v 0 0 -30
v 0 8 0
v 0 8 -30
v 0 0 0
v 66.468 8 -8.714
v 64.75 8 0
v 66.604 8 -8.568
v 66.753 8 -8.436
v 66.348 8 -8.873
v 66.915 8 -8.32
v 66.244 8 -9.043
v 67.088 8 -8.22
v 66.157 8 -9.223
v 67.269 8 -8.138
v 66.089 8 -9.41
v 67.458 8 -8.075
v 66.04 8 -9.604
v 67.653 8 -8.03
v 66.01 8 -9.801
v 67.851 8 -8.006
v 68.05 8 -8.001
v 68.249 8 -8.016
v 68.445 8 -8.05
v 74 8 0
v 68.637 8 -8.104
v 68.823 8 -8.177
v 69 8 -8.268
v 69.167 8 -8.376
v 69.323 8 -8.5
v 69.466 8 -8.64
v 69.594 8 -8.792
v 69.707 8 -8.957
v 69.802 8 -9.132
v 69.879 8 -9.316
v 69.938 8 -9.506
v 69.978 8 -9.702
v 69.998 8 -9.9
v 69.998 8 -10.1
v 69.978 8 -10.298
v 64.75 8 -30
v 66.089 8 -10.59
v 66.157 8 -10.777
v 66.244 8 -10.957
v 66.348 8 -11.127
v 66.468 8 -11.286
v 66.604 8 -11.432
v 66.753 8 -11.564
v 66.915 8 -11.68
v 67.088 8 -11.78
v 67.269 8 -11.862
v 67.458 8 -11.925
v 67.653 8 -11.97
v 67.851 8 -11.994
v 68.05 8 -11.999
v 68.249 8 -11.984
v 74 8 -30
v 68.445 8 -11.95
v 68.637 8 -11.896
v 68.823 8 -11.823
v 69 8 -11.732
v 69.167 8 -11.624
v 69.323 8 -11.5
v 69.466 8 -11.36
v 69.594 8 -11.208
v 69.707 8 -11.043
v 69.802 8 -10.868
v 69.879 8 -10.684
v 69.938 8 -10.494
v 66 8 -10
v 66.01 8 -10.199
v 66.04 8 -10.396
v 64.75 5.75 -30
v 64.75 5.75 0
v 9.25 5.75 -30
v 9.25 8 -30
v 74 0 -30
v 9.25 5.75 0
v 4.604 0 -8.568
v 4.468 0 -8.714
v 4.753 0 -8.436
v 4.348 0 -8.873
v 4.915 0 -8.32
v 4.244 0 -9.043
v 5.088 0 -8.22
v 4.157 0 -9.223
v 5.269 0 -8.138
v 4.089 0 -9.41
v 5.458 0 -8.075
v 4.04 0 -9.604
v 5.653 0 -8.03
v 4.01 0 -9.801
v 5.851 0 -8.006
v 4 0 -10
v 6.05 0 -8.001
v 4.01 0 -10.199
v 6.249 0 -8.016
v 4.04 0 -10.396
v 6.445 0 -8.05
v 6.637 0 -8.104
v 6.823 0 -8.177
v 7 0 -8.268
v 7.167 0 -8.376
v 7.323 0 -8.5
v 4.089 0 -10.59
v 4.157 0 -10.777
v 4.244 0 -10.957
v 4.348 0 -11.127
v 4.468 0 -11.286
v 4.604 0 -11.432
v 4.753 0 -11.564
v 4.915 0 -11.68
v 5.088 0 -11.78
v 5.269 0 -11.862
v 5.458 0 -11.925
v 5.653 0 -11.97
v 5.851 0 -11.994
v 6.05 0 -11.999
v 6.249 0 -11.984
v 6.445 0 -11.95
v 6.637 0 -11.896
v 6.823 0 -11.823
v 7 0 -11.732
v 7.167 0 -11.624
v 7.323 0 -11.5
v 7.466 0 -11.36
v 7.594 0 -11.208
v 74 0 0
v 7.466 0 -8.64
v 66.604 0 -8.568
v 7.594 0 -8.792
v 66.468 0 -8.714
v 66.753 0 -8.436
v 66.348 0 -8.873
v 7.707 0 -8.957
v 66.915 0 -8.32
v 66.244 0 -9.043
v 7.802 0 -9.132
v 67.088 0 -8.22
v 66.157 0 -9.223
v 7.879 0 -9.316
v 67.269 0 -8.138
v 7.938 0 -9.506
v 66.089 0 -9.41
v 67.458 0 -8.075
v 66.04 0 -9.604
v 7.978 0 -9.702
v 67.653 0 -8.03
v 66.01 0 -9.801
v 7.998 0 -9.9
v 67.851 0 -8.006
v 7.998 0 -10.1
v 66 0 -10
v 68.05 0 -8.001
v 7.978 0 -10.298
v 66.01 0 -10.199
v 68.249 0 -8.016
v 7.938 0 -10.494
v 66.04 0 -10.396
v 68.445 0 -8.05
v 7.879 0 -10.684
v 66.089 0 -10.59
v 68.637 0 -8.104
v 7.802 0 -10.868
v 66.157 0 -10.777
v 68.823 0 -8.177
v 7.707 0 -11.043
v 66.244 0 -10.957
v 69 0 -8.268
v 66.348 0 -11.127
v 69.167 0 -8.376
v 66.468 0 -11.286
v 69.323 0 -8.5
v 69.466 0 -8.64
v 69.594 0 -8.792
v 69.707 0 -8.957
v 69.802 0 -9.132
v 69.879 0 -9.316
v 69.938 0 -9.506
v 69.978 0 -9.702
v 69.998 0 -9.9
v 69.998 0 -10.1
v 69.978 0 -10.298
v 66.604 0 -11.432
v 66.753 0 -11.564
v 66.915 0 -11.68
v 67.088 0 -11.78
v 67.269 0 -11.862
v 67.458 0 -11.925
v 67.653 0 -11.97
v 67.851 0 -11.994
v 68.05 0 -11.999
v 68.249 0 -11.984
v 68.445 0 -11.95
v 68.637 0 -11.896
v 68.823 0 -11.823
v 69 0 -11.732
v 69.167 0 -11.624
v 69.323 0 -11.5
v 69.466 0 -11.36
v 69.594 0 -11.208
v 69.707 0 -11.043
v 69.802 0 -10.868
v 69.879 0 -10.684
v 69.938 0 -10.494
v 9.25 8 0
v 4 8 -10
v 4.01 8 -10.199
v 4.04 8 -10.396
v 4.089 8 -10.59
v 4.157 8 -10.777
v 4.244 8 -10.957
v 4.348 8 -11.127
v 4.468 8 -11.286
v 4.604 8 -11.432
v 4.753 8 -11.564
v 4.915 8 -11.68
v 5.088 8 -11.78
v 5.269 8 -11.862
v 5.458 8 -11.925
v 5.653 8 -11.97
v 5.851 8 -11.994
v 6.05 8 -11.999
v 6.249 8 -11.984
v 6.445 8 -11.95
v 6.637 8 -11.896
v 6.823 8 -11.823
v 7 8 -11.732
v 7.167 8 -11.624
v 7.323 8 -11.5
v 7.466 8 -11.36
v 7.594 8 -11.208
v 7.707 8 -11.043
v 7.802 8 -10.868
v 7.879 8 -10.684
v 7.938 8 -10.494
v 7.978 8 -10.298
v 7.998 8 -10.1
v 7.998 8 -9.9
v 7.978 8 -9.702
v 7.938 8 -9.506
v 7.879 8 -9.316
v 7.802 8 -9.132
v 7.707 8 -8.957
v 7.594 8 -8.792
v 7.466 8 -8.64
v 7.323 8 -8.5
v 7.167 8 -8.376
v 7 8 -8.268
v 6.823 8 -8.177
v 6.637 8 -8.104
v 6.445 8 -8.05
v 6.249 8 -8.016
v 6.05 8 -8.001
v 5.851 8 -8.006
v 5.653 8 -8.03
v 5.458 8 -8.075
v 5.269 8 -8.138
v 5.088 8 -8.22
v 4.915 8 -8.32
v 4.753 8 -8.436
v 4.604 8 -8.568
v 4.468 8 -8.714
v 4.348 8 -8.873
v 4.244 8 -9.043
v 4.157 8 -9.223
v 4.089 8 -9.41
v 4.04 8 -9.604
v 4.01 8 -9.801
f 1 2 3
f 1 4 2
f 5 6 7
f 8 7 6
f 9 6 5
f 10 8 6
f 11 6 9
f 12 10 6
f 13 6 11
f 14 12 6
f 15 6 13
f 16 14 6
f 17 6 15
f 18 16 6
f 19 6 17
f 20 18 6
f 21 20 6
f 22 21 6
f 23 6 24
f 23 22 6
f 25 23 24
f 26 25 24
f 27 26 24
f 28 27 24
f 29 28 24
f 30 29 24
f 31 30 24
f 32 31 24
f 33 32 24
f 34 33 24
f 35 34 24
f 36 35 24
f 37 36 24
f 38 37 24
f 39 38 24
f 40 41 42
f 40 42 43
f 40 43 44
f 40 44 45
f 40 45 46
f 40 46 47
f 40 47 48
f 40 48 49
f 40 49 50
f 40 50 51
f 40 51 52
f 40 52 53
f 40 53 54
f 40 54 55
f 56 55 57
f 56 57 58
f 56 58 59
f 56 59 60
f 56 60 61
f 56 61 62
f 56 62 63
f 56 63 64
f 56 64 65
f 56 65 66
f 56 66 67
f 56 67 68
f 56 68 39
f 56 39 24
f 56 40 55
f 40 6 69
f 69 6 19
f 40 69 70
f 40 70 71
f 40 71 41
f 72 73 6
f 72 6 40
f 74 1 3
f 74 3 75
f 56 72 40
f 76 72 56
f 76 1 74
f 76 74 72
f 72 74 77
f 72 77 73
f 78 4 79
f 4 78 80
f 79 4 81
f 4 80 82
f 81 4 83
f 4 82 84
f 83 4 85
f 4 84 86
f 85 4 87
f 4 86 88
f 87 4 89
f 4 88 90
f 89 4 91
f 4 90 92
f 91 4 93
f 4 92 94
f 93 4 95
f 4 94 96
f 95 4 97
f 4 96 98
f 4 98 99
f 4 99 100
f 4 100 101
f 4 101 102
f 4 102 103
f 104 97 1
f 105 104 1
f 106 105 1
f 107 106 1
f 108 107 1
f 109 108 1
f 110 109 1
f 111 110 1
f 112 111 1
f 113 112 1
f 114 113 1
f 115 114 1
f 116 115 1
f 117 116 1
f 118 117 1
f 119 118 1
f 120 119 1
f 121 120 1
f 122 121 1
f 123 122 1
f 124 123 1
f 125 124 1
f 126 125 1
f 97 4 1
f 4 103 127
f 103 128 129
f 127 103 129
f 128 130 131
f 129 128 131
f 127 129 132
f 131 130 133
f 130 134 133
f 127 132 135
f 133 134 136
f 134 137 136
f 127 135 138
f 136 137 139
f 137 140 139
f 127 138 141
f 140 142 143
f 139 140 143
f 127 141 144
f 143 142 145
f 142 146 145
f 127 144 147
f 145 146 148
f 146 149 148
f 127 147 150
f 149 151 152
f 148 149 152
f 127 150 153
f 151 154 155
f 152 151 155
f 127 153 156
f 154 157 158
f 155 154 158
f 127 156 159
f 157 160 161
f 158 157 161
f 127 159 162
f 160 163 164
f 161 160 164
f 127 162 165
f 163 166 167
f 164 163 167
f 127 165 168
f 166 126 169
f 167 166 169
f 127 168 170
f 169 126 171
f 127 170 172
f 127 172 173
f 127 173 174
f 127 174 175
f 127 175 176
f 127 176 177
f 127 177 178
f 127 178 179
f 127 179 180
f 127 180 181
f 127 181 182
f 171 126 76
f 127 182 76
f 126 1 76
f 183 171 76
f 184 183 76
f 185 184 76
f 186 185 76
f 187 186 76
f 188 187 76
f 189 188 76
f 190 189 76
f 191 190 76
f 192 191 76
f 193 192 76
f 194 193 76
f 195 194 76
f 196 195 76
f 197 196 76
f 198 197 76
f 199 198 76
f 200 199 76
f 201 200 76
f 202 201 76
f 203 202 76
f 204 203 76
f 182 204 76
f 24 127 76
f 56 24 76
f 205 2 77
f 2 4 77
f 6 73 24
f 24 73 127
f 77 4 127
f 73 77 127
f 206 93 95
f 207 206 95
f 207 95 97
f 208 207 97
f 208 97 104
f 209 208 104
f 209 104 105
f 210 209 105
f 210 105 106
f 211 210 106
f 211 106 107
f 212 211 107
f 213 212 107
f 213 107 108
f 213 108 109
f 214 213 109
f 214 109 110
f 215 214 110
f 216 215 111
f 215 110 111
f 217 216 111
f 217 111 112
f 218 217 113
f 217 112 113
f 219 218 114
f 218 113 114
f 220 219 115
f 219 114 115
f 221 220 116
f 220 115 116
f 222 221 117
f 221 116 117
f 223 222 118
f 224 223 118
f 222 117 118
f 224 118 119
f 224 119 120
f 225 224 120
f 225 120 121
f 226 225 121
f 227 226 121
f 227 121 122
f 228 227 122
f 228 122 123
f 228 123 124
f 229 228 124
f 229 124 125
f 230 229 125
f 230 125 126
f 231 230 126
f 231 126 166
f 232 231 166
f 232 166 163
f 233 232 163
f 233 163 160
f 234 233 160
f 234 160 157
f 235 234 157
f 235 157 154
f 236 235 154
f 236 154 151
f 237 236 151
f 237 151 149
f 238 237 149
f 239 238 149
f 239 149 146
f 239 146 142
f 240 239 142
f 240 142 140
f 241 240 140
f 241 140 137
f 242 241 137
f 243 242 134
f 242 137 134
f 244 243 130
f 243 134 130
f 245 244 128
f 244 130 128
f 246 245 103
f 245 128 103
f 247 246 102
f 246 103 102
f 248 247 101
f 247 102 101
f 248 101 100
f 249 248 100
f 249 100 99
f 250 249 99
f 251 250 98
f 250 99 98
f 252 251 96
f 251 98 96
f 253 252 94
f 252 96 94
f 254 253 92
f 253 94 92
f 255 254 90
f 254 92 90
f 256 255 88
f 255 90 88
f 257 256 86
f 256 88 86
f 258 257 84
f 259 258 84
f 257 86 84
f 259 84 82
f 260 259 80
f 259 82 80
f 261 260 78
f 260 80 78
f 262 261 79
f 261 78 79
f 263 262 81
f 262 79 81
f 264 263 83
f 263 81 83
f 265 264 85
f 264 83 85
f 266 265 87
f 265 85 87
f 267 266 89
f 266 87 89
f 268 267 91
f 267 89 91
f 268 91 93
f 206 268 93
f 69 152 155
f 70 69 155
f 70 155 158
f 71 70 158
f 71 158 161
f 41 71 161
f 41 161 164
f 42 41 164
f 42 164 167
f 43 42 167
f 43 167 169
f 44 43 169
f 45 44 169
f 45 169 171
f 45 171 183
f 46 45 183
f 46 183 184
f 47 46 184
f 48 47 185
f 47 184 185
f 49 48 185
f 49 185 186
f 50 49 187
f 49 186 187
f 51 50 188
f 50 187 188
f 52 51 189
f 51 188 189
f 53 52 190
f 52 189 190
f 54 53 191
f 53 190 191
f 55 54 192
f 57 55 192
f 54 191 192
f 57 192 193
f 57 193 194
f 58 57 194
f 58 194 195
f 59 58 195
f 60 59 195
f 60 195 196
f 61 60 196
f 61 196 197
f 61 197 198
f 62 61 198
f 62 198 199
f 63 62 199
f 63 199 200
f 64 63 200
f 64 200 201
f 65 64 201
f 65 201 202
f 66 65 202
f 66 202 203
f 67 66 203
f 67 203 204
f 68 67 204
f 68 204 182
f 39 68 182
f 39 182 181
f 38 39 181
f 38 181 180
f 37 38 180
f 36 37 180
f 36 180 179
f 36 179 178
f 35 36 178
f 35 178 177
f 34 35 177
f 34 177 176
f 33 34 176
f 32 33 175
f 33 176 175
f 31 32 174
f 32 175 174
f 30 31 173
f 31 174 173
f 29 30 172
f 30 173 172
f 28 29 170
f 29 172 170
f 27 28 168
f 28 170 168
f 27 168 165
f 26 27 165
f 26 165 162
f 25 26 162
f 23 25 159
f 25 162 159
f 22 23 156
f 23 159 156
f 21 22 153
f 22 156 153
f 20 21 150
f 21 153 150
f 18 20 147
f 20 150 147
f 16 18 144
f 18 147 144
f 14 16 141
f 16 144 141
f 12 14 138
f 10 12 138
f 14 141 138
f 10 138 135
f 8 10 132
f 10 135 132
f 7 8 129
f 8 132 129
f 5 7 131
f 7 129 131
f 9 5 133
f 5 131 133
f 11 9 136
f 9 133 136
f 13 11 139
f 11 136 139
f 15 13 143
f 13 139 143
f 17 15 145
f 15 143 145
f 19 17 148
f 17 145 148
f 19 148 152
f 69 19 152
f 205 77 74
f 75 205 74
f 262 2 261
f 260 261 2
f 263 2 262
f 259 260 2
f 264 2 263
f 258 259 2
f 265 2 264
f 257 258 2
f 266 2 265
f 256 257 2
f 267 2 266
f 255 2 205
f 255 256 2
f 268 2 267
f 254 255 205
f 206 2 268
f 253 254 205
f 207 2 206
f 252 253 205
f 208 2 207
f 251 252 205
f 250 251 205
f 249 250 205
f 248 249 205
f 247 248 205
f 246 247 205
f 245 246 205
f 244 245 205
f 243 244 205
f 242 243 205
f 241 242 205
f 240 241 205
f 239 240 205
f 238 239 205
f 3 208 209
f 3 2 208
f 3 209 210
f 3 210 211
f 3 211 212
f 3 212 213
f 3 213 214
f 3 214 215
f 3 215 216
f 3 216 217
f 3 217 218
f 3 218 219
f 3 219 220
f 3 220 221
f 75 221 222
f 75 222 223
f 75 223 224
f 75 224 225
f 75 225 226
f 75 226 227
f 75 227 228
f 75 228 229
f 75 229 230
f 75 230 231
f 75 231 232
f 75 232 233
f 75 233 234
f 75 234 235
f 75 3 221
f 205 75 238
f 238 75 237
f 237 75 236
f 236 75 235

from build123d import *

# Parameters (mm, degrees)
SKETCH1_W           = 74
SKETCH1_H           = 30
BOSS_EXTRUDE1_DEPTH = 5.75
SKETCH2_W           = 9.25
SKETCH2_H           = 30
BOSS_EXTRUDE2_DEPTH = 2.25
SKETCH3_R           = 2
CUT_EXTRUDE1_DEPTH  = 9


with BuildPart() as part:
    # Sketch1 → Boss-Extrude1 (new body)
    with BuildSketch(Plane(origin=(0, 0, 0), x_dir=(1, 0, 0), z_dir=(0, 1, 0))):
        with Locations((37, 15)):
            Rectangle(SKETCH1_W, SKETCH1_H)
    extrude(amount=BOSS_EXTRUDE1_DEPTH)

    # Sketch2 → Boss-Extrude2 (add)
    with BuildSketch(Plane(origin=(0, 5.75, 0), x_dir=(1, 0, 0), z_dir=(0, 1, 0))):
        with Locations((4.625, 15)):
            Rectangle(SKETCH2_W, SKETCH2_H)
        with Locations((69.375, 15)):
            Rectangle(SKETCH2_W, SKETCH2_H)
    extrude(amount=BOSS_EXTRUDE2_DEPTH)

    # Sketch3 → Cut-Extrude1 (cut, through all)
    with BuildSketch(Plane(origin=(0, 0, 0), x_dir=(-1, 0, 0), z_dir=(0, -1, 0))):
        with Locations((-68, 10)):
            Circle(SKETCH3_R)
        with Locations((-6, 10)):
            Circle(SKETCH3_R)
    extrude(amount=-CUT_EXTRUDE1_DEPTH, mode=Mode.SUBTRACT)


solid = part.part
